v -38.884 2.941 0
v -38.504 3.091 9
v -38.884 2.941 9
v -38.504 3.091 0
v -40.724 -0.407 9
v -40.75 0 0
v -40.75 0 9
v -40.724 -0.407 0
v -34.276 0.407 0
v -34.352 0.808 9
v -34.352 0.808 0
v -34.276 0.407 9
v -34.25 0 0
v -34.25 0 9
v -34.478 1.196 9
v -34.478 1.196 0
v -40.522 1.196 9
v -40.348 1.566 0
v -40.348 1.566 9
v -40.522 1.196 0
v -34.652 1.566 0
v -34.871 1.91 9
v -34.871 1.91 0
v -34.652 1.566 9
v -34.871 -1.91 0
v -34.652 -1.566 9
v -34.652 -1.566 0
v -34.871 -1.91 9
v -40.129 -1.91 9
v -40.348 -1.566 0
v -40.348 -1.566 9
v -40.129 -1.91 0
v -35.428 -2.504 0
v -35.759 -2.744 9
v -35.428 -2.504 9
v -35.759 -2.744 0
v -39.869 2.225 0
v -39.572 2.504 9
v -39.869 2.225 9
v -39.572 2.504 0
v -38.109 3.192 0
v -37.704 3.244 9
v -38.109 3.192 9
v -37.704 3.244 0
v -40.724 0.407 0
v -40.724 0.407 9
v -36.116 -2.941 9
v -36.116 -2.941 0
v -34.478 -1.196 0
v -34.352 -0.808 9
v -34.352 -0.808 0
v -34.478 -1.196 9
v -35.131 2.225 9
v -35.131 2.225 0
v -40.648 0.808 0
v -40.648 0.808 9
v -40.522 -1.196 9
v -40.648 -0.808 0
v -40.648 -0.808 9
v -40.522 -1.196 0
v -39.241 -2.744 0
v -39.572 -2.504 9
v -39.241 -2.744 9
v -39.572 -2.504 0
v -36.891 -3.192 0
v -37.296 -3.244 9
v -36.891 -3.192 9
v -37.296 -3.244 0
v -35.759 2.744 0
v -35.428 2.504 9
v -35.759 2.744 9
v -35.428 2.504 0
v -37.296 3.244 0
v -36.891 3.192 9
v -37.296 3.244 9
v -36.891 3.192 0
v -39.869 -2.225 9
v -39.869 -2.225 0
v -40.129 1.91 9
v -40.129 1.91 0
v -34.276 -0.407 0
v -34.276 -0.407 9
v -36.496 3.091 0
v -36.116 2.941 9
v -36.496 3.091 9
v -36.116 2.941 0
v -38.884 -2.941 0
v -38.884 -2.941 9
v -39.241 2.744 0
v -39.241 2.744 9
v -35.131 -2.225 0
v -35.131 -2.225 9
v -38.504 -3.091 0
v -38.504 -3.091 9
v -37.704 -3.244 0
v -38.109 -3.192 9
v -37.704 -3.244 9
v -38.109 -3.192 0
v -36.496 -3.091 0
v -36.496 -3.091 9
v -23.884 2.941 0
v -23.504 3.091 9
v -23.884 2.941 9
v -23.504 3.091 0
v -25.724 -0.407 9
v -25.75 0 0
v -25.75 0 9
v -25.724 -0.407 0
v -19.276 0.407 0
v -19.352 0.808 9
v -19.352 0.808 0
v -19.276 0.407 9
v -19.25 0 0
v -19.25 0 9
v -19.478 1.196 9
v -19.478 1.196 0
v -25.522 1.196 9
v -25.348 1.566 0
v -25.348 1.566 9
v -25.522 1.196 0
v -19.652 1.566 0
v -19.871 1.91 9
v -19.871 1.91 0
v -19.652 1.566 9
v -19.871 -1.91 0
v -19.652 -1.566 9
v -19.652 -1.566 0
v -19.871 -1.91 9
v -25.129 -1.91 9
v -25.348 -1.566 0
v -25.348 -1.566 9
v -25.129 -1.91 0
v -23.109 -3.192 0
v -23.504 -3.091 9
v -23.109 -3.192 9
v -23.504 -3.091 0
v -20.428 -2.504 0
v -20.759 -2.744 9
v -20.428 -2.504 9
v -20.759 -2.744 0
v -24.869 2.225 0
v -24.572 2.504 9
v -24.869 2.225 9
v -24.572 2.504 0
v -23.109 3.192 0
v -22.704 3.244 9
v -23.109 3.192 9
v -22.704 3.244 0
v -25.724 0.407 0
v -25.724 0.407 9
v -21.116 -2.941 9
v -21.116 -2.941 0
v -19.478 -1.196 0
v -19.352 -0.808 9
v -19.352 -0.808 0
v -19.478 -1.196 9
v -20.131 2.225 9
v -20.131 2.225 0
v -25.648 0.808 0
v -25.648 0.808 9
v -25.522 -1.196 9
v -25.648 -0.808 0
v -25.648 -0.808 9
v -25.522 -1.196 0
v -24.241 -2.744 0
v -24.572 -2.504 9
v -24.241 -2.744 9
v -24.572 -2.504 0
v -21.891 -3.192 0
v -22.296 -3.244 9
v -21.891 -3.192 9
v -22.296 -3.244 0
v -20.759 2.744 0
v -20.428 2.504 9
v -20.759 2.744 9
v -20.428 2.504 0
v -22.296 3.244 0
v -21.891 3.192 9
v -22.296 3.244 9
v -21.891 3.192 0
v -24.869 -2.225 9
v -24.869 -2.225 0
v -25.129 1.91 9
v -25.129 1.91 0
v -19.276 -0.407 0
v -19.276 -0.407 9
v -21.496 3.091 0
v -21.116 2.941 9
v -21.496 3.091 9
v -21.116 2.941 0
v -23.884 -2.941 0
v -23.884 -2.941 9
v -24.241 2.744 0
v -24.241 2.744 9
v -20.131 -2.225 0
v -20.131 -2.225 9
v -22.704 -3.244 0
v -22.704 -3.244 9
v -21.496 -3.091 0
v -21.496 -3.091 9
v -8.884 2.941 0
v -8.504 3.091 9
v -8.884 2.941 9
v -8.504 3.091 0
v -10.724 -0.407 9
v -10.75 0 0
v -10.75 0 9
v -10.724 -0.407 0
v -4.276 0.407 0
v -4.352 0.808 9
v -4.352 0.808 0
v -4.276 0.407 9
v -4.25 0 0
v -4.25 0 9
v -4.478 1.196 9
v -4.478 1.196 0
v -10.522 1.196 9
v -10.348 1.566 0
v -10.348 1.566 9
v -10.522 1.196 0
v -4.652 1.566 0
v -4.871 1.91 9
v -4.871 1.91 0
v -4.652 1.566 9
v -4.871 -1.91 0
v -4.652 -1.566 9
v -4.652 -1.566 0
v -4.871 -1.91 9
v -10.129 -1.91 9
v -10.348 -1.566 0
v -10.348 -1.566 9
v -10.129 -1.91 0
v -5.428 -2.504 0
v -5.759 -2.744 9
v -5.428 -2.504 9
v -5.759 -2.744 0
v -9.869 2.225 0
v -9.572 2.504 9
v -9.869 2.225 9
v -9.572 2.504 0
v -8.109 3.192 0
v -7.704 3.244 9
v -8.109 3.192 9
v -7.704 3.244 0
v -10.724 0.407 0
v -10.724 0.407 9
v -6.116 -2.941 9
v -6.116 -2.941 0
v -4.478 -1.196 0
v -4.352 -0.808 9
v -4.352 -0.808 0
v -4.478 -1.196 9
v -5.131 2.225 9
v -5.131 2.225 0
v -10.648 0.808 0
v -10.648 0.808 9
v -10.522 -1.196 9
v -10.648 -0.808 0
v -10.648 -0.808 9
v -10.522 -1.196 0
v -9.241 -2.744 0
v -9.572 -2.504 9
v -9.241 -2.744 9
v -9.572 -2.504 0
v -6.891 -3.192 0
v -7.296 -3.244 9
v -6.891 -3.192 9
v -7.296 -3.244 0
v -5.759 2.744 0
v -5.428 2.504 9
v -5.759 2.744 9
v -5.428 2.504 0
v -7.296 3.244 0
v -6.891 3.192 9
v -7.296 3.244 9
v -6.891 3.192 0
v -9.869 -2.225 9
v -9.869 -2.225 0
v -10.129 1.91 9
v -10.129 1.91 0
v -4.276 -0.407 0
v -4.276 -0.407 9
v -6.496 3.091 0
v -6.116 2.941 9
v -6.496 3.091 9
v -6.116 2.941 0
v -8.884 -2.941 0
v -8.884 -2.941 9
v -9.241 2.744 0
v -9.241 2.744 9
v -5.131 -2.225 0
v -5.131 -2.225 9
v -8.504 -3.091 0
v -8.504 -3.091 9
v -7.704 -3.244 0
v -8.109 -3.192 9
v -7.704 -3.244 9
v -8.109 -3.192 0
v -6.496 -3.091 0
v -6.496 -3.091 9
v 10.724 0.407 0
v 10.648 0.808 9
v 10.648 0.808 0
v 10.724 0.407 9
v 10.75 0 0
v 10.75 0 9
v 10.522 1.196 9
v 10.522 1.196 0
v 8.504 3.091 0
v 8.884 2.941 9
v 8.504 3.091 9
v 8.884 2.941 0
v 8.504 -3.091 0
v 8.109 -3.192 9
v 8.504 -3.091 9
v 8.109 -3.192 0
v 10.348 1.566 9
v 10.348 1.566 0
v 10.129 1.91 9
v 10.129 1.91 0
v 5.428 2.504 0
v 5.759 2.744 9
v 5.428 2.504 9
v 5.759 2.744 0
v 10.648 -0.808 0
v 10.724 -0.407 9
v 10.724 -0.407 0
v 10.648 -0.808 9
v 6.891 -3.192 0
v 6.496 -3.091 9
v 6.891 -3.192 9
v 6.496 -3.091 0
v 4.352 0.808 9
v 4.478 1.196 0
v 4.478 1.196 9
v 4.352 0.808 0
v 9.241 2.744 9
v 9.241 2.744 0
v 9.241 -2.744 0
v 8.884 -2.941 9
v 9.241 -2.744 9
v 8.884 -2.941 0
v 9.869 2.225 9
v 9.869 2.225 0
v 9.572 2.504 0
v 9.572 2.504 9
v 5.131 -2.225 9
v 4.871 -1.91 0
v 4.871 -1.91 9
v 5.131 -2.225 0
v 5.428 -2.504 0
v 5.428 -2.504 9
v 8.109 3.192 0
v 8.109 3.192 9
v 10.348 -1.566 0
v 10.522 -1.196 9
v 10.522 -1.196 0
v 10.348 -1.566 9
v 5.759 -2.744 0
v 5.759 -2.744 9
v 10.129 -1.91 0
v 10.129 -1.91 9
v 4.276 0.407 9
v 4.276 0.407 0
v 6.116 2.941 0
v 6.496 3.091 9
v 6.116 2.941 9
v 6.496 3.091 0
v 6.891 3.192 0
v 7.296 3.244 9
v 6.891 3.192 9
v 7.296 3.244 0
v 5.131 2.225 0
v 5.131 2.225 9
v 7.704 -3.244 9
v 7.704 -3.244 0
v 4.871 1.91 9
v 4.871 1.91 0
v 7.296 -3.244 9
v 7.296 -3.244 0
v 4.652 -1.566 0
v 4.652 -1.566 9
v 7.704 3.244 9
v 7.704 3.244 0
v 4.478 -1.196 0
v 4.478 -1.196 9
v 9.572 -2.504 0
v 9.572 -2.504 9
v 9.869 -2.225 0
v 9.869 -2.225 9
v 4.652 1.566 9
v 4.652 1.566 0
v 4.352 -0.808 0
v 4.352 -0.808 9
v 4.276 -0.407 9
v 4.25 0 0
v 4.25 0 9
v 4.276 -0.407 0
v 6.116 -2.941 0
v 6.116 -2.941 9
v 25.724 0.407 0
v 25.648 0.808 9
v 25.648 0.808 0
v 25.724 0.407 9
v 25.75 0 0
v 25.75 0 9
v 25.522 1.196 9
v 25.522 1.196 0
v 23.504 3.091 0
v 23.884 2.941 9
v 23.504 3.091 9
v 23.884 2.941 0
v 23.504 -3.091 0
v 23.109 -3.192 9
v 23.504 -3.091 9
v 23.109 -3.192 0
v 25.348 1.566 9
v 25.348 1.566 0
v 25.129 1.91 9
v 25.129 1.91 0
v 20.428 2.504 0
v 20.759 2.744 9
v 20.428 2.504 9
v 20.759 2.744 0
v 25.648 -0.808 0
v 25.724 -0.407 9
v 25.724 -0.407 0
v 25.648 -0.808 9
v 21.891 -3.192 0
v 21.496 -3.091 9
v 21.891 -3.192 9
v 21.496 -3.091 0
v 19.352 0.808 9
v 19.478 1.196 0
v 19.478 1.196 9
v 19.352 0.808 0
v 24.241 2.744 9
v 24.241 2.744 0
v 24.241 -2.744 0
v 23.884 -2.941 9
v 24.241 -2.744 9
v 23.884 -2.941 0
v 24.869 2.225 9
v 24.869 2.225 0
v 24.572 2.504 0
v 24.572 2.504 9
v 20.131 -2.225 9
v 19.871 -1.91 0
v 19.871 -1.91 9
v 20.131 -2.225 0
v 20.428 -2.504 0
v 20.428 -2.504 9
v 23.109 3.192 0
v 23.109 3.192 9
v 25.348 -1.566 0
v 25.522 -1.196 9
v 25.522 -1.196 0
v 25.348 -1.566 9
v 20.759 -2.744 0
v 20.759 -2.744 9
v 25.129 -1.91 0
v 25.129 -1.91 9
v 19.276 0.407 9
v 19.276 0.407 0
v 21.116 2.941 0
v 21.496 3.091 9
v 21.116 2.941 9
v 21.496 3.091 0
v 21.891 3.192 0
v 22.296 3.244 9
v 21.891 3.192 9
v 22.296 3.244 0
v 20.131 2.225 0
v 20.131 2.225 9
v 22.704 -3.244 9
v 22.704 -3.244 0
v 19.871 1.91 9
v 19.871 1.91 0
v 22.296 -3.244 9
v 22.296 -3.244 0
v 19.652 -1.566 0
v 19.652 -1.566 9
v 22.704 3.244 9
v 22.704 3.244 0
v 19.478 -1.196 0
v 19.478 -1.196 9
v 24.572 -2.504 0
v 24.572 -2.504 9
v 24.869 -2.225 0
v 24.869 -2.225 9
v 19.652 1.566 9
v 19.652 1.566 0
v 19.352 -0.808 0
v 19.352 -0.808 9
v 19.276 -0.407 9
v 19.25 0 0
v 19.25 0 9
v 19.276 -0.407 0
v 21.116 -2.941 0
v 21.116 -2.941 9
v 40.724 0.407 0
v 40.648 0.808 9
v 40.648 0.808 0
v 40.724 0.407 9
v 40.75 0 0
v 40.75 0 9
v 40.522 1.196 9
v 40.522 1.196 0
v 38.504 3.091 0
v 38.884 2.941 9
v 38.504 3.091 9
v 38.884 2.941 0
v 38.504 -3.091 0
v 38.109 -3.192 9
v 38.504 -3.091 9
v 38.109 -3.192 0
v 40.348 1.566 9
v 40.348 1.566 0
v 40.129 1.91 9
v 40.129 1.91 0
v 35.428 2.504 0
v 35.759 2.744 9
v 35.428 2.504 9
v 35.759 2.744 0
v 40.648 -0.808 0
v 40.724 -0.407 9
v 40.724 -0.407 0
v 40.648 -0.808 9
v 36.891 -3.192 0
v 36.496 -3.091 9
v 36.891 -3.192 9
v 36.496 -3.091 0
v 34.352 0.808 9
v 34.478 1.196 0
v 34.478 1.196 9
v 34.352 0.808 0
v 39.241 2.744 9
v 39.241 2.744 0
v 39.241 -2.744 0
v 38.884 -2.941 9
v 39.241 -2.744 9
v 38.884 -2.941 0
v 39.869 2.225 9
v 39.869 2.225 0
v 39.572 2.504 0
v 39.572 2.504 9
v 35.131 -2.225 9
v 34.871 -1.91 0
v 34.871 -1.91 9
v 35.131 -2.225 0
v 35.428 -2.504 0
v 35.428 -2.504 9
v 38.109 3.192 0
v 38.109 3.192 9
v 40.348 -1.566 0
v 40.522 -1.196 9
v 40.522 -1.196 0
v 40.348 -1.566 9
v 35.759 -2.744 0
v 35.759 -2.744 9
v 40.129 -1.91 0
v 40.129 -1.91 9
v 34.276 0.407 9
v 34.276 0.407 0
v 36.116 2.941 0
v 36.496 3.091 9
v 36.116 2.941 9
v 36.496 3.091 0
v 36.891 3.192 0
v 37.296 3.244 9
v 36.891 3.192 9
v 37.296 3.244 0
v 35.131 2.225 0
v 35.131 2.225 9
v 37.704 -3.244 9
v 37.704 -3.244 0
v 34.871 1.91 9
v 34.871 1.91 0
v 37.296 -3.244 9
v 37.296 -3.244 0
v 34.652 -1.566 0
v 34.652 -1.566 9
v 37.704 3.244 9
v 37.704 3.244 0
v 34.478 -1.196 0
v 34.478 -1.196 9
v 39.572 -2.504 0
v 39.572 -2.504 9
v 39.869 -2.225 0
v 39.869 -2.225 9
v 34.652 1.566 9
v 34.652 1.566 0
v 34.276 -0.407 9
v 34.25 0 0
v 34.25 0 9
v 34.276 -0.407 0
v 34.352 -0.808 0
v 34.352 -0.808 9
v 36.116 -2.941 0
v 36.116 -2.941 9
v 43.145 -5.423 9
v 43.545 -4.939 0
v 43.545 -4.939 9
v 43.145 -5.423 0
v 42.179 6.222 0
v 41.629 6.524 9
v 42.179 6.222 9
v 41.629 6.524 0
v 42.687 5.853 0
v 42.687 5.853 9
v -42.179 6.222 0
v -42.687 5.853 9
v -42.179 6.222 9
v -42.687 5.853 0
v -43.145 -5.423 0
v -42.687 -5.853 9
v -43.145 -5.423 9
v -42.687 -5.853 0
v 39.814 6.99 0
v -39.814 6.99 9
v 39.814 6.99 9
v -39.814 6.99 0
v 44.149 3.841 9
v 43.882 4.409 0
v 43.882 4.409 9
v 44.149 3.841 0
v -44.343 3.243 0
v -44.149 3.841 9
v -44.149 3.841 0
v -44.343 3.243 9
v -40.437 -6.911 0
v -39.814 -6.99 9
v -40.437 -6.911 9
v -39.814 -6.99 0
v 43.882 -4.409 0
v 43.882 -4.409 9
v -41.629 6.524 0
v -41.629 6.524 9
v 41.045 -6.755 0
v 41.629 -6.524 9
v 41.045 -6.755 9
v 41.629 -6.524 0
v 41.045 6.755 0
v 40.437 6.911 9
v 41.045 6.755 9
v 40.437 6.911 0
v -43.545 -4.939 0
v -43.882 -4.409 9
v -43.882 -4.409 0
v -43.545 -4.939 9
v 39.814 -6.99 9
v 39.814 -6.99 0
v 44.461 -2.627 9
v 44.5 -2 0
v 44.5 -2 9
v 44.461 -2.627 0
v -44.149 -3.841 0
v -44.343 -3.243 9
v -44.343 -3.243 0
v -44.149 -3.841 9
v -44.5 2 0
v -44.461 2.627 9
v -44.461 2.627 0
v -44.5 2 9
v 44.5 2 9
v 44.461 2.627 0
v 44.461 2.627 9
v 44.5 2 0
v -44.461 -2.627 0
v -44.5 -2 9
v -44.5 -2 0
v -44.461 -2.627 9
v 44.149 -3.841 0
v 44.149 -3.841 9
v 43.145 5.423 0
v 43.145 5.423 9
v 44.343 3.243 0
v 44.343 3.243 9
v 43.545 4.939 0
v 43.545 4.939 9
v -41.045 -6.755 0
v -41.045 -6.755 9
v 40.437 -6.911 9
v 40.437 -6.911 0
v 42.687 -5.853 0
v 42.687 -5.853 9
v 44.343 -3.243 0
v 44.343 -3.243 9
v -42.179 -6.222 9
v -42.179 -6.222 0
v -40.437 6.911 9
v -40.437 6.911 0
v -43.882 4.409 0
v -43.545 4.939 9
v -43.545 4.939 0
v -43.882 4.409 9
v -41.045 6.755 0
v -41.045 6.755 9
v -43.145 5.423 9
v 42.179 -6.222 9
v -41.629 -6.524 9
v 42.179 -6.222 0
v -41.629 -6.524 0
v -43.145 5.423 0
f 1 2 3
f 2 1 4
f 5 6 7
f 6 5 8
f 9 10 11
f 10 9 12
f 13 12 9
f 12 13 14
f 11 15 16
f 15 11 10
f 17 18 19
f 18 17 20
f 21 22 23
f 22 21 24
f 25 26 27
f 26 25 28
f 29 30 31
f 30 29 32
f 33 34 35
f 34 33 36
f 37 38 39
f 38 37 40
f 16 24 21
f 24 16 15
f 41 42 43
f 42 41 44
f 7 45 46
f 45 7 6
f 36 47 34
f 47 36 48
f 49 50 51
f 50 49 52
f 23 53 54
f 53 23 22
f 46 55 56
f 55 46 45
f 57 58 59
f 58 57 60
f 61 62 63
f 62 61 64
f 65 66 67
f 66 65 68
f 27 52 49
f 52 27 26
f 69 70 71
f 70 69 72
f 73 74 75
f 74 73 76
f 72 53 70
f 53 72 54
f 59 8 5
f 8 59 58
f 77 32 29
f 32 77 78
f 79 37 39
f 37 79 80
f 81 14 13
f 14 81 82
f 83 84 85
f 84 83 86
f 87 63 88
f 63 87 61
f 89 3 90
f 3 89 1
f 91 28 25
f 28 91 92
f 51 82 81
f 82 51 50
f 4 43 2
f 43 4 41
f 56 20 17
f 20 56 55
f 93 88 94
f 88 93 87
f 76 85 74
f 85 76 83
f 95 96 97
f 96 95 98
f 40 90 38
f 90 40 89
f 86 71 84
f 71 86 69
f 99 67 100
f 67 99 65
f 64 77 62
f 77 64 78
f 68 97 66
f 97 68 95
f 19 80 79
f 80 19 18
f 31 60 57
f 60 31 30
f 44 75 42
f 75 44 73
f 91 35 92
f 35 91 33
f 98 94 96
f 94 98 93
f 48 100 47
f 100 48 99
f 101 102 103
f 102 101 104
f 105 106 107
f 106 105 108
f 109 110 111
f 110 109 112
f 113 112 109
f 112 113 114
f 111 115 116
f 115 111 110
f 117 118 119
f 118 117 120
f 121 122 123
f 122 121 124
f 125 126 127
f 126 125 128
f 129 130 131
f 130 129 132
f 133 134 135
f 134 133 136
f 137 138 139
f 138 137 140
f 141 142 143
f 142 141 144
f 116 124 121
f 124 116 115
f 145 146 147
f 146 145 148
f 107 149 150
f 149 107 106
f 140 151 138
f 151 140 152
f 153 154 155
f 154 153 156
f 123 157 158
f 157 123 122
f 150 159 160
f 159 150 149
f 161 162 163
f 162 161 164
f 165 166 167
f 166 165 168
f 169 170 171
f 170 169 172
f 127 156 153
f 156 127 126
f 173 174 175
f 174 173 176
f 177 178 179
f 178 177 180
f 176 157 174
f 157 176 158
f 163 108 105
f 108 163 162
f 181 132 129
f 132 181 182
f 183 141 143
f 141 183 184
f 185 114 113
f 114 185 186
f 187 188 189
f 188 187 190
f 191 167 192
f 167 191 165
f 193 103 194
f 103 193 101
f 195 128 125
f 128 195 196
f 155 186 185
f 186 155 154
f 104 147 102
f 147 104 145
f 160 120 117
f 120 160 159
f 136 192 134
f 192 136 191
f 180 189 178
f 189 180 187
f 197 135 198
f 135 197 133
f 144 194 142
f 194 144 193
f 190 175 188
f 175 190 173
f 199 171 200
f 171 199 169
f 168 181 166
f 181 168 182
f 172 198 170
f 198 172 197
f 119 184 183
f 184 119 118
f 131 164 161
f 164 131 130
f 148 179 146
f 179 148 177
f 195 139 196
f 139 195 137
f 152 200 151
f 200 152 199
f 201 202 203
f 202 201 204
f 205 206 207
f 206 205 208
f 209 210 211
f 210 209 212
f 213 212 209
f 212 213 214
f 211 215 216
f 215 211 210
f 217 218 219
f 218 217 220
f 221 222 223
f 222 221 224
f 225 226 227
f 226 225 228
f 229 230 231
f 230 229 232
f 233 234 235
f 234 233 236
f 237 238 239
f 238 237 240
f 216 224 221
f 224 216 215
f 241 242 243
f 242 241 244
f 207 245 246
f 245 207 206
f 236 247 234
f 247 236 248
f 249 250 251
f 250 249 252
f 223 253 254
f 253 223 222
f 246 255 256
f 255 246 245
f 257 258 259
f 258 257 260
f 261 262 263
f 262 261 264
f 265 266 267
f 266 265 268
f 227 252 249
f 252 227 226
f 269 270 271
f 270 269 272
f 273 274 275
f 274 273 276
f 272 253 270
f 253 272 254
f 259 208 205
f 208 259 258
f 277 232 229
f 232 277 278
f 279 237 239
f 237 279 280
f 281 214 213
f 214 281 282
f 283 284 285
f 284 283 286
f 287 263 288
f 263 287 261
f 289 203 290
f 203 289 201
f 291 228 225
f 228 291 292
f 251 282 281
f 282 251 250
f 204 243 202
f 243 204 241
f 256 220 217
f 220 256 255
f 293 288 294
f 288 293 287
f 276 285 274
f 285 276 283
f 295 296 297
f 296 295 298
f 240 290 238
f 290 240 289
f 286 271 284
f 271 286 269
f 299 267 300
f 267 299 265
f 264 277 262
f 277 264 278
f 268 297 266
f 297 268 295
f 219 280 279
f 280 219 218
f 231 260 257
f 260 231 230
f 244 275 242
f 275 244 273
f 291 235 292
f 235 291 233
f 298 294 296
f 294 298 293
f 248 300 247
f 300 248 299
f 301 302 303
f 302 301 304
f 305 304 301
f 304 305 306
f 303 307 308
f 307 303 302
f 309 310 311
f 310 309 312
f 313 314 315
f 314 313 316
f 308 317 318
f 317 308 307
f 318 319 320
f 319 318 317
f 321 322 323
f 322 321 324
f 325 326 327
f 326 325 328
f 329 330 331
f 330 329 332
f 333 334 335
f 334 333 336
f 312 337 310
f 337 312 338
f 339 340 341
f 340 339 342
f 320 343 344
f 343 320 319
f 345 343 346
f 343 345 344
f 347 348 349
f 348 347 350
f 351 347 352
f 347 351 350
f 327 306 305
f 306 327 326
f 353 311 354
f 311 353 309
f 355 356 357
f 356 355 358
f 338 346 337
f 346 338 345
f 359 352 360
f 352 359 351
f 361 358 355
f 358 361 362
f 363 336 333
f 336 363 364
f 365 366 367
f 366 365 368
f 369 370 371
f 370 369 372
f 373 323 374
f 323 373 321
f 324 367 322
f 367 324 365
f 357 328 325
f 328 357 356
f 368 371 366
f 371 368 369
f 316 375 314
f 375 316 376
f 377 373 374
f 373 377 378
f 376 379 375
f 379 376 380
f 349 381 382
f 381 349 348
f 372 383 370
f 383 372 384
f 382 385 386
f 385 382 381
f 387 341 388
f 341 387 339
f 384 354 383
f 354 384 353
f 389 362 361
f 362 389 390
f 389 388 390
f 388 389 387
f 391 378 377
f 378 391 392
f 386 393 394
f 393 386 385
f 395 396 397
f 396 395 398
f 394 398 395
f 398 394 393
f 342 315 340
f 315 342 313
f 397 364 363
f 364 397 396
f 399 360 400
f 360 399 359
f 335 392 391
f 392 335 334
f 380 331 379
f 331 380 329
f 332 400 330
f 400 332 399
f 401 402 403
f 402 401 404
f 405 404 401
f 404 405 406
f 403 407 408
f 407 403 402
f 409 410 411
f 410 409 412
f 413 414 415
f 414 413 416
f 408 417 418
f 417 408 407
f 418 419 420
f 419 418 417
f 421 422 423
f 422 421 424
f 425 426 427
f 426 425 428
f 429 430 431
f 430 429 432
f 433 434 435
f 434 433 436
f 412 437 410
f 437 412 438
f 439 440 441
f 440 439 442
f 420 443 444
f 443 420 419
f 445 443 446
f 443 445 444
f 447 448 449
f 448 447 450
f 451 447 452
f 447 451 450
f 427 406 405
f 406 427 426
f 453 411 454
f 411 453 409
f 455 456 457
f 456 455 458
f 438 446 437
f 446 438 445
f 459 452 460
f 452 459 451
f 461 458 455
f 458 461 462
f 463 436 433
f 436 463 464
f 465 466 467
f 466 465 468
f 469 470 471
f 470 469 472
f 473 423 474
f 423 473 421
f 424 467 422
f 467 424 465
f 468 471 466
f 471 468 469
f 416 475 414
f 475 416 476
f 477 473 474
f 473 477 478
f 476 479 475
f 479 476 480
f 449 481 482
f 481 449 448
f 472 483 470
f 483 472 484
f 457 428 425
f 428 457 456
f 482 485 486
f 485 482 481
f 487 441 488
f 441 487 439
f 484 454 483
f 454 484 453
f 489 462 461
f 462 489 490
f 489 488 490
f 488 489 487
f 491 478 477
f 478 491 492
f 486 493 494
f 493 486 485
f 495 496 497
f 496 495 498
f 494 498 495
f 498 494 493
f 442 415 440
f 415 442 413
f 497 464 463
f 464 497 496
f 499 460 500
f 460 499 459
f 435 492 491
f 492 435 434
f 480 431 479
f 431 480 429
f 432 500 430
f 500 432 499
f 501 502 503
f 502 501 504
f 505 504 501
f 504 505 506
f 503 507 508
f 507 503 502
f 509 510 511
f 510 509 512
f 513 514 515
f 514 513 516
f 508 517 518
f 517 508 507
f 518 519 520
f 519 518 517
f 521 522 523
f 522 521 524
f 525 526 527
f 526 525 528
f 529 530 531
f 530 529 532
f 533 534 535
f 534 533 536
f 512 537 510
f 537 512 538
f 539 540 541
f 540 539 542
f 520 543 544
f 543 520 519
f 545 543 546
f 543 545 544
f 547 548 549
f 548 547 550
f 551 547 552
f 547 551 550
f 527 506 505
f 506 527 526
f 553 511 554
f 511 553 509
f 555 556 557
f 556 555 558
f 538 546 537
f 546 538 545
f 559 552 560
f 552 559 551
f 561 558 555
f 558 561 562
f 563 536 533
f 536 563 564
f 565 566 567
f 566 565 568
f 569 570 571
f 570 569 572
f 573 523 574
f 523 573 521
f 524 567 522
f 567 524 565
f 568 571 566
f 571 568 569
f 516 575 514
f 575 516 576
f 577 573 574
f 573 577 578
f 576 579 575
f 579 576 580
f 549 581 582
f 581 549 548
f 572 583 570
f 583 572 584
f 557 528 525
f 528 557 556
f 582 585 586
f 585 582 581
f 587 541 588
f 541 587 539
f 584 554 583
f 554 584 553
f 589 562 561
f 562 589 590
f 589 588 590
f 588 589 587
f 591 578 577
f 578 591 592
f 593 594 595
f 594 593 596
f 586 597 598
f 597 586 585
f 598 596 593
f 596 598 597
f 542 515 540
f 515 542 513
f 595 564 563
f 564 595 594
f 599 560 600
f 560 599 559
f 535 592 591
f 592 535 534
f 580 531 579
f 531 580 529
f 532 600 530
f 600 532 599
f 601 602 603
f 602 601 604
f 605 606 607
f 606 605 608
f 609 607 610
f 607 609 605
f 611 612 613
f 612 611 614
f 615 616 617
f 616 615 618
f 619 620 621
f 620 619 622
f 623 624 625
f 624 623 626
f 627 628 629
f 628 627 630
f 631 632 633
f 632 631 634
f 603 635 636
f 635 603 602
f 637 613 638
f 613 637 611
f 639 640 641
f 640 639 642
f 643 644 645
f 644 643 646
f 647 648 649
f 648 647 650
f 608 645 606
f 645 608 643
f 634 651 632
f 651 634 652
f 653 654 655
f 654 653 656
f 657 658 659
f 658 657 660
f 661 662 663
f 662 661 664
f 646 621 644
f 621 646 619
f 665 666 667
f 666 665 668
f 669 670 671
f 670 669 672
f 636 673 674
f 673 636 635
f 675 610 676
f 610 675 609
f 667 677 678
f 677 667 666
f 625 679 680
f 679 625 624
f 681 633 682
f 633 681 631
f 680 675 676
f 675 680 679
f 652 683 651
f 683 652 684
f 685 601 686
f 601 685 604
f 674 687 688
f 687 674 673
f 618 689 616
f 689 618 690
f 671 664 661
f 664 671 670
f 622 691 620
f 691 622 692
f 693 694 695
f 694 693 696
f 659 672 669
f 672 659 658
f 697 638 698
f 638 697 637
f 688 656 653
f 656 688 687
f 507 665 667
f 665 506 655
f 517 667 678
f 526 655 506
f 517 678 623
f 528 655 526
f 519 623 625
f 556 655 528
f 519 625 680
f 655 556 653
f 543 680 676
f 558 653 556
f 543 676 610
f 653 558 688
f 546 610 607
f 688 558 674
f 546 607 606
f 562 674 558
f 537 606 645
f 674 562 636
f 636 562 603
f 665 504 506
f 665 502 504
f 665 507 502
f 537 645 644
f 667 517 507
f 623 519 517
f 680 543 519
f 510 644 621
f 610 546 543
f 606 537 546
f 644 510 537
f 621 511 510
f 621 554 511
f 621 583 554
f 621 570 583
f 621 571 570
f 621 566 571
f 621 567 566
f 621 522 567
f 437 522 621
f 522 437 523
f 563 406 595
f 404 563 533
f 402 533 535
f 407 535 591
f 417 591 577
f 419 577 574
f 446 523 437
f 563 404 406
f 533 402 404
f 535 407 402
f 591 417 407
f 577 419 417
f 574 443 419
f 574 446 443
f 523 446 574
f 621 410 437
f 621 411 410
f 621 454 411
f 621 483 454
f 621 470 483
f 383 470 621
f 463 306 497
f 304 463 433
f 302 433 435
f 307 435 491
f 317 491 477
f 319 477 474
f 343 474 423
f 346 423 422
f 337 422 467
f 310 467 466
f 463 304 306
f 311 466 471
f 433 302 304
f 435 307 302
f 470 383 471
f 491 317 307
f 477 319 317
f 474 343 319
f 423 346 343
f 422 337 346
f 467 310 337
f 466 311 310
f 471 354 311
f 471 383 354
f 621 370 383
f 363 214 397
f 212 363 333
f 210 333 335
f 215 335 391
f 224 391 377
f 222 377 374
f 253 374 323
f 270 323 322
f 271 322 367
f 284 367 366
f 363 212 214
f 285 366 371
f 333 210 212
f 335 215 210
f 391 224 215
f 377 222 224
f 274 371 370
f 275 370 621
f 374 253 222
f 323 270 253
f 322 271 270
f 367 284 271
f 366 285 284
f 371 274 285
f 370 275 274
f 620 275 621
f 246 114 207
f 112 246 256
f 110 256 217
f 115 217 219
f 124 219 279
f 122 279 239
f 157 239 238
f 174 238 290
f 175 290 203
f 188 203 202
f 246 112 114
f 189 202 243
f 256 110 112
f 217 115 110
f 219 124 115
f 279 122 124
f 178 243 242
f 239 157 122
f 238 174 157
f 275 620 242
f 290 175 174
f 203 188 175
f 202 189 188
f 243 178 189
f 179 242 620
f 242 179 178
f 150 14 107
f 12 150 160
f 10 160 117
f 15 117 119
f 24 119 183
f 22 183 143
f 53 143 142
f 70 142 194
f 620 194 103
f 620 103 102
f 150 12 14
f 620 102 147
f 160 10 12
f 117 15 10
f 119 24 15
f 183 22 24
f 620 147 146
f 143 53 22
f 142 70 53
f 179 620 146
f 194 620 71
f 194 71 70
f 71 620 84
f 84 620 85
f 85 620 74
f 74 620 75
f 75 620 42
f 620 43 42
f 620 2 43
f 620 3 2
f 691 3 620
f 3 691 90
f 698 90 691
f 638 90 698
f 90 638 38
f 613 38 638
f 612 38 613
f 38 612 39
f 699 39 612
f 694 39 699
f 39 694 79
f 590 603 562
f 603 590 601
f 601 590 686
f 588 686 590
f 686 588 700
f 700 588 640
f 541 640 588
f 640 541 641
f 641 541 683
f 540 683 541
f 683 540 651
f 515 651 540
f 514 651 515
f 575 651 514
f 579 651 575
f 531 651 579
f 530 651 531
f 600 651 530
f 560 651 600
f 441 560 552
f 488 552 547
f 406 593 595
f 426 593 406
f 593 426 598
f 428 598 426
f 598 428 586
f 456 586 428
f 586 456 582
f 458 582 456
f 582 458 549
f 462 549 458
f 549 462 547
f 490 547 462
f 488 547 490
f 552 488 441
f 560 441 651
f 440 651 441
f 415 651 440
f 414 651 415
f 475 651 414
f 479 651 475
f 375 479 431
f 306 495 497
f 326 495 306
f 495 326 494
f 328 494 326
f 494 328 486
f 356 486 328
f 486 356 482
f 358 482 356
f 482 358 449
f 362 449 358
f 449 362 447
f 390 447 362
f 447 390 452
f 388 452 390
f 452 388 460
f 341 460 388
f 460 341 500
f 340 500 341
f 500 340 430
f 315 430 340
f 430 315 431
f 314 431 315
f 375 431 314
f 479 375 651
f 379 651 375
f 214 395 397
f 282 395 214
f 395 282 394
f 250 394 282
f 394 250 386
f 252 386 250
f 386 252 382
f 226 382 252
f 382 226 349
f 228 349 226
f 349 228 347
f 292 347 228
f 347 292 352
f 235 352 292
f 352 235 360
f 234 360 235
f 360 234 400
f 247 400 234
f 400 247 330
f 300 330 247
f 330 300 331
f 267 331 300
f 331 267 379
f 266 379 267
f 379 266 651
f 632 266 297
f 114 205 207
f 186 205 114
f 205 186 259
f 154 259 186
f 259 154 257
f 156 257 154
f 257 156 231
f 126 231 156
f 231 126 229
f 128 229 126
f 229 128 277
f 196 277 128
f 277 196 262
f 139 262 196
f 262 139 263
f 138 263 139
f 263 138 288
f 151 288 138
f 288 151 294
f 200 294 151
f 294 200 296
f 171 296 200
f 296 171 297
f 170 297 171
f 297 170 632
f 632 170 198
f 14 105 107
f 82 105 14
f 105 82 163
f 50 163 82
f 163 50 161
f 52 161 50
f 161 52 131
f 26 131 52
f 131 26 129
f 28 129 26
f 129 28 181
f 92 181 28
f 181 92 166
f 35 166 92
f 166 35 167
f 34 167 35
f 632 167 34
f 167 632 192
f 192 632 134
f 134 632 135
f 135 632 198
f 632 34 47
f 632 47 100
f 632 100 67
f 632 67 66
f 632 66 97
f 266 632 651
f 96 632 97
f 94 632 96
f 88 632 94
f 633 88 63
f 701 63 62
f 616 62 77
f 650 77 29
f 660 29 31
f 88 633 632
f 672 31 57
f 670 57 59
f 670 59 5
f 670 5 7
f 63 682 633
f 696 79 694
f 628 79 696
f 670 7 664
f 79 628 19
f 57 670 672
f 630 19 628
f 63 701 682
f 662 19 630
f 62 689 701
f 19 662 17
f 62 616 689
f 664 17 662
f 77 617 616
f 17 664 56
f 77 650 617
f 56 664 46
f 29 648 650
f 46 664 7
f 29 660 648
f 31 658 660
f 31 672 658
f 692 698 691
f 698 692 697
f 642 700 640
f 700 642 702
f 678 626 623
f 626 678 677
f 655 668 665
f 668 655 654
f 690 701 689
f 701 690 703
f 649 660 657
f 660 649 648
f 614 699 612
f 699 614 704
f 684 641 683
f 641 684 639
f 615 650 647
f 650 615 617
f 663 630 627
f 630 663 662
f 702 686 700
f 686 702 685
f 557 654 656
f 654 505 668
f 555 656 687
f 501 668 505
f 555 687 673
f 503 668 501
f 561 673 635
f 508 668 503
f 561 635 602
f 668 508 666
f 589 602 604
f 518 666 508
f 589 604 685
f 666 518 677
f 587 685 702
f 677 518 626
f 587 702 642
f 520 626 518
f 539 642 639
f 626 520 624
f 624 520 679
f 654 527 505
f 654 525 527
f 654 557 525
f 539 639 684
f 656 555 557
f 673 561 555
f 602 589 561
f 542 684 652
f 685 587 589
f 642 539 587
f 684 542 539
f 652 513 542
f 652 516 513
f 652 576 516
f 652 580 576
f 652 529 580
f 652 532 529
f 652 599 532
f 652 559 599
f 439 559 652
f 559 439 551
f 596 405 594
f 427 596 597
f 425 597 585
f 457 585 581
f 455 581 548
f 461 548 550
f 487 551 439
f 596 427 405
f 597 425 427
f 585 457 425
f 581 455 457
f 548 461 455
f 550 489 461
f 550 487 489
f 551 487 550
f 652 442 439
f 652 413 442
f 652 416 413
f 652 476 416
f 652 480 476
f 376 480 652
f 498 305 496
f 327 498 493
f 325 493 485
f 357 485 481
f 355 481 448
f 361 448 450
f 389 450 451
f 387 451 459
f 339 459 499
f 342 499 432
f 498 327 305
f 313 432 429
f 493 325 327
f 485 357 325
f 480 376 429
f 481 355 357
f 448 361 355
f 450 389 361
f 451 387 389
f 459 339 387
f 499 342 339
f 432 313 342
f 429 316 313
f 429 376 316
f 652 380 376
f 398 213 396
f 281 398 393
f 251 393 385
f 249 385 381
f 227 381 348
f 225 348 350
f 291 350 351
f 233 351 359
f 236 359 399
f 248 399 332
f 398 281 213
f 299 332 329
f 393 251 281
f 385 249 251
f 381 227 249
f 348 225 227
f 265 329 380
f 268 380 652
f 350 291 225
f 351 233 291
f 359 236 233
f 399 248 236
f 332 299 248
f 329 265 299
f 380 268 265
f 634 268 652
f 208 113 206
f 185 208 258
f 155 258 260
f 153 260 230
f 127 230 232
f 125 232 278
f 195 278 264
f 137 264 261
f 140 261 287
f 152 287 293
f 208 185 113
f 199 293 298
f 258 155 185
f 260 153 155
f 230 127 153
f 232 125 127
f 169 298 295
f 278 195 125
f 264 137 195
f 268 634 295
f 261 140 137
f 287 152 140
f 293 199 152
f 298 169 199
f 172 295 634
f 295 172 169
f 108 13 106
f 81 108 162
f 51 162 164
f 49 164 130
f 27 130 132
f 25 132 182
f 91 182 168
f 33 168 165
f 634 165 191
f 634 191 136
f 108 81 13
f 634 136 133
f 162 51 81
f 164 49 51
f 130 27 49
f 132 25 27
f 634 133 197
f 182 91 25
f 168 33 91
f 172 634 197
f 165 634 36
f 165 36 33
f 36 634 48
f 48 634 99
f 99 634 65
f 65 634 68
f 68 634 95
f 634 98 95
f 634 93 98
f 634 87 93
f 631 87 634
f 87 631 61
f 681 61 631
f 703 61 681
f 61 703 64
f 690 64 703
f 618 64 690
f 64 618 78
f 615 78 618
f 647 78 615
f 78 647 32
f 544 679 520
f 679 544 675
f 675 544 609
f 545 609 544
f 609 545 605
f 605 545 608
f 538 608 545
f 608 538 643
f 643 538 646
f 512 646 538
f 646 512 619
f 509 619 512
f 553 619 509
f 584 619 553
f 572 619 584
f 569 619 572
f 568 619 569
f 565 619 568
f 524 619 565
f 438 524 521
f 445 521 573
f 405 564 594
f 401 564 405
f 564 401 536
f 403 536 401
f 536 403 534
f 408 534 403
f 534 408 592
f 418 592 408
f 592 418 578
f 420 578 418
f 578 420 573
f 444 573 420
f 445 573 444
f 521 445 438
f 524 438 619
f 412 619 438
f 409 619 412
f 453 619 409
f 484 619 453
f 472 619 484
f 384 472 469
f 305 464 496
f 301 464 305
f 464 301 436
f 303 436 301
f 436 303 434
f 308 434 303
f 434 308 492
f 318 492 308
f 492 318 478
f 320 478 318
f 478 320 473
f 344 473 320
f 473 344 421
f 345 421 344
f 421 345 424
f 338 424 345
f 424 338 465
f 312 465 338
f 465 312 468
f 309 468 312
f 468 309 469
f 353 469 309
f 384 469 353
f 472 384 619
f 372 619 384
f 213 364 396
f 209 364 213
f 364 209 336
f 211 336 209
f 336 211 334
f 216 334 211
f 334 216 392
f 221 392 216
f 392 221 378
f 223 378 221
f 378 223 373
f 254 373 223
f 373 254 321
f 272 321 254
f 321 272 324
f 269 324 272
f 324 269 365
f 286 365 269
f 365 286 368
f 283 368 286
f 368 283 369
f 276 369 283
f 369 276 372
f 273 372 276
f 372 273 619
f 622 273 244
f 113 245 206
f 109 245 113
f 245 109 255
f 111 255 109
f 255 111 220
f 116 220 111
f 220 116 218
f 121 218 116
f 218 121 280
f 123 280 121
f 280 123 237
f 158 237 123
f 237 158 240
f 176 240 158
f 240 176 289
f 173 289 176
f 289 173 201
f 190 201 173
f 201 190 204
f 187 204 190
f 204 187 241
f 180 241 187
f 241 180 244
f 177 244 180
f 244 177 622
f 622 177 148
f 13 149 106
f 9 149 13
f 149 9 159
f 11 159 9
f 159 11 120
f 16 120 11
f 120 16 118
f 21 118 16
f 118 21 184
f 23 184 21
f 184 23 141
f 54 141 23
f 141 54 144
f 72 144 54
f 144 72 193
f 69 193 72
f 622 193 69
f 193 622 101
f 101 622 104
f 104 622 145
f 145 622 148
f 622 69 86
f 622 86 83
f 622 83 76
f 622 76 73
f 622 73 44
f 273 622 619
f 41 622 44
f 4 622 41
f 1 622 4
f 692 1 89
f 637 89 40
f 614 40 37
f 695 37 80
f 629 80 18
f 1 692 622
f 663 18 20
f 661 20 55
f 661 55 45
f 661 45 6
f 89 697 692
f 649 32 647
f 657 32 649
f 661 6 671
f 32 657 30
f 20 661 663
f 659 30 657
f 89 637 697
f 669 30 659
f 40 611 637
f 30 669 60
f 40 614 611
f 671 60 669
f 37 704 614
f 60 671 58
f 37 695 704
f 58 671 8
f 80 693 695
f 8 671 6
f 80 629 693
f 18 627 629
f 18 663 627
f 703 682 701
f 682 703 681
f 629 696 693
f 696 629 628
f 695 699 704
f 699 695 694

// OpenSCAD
$fn = 50;


difference() {
	union() {
		hull() {
			translate(v = [-39.5000000000, 2.0000000000, 0]) {
				cylinder(h = 9, r = 5);
			}
			translate(v = [39.5000000000, 2.0000000000, 0]) {
				cylinder(h = 9, r = 5);
			}
			translate(v = [-39.5000000000, -2.0000000000, 0]) {
				cylinder(h = 9, r = 5);
			}
			translate(v = [39.5000000000, -2.0000000000, 0]) {
				cylinder(h = 9, r = 5);
			}
		}
	}
	union() {
		translate(v = [-37.5000000000, 0.0000000000, 0]) {
			translate(v = [0, 0, -100]) {
				cylinder(h = 200, r = 3.2500000000);
			}
		}
		translate(v = [-22.5000000000, 0.0000000000, 0]) {
			translate(v = [0, 0, -100]) {
				cylinder(h = 200, r = 3.2500000000);
			}
		}
		translate(v = [-7.5000000000, 0.0000000000, 0]) {
			translate(v = [0, 0, -100]) {
				cylinder(h = 200, r = 3.2500000000);
			}
		}
		translate(v = [7.5000000000, 0.0000000000, 0]) {
			translate(v = [0, 0, -100]) {
				cylinder(h = 200, r = 3.2500000000);
			}
		}
		translate(v = [22.5000000000, 0.0000000000, 0]) {
			translate(v = [0, 0, -100]) {
				cylinder(h = 200, r = 3.2500000000);
			}
		}
		translate(v = [37.5000000000, 0.0000000000, 0]) {
			translate(v = [0, 0, -100]) {
				cylinder(h = 200, r = 3.2500000000);
			}
		}
	}
}
